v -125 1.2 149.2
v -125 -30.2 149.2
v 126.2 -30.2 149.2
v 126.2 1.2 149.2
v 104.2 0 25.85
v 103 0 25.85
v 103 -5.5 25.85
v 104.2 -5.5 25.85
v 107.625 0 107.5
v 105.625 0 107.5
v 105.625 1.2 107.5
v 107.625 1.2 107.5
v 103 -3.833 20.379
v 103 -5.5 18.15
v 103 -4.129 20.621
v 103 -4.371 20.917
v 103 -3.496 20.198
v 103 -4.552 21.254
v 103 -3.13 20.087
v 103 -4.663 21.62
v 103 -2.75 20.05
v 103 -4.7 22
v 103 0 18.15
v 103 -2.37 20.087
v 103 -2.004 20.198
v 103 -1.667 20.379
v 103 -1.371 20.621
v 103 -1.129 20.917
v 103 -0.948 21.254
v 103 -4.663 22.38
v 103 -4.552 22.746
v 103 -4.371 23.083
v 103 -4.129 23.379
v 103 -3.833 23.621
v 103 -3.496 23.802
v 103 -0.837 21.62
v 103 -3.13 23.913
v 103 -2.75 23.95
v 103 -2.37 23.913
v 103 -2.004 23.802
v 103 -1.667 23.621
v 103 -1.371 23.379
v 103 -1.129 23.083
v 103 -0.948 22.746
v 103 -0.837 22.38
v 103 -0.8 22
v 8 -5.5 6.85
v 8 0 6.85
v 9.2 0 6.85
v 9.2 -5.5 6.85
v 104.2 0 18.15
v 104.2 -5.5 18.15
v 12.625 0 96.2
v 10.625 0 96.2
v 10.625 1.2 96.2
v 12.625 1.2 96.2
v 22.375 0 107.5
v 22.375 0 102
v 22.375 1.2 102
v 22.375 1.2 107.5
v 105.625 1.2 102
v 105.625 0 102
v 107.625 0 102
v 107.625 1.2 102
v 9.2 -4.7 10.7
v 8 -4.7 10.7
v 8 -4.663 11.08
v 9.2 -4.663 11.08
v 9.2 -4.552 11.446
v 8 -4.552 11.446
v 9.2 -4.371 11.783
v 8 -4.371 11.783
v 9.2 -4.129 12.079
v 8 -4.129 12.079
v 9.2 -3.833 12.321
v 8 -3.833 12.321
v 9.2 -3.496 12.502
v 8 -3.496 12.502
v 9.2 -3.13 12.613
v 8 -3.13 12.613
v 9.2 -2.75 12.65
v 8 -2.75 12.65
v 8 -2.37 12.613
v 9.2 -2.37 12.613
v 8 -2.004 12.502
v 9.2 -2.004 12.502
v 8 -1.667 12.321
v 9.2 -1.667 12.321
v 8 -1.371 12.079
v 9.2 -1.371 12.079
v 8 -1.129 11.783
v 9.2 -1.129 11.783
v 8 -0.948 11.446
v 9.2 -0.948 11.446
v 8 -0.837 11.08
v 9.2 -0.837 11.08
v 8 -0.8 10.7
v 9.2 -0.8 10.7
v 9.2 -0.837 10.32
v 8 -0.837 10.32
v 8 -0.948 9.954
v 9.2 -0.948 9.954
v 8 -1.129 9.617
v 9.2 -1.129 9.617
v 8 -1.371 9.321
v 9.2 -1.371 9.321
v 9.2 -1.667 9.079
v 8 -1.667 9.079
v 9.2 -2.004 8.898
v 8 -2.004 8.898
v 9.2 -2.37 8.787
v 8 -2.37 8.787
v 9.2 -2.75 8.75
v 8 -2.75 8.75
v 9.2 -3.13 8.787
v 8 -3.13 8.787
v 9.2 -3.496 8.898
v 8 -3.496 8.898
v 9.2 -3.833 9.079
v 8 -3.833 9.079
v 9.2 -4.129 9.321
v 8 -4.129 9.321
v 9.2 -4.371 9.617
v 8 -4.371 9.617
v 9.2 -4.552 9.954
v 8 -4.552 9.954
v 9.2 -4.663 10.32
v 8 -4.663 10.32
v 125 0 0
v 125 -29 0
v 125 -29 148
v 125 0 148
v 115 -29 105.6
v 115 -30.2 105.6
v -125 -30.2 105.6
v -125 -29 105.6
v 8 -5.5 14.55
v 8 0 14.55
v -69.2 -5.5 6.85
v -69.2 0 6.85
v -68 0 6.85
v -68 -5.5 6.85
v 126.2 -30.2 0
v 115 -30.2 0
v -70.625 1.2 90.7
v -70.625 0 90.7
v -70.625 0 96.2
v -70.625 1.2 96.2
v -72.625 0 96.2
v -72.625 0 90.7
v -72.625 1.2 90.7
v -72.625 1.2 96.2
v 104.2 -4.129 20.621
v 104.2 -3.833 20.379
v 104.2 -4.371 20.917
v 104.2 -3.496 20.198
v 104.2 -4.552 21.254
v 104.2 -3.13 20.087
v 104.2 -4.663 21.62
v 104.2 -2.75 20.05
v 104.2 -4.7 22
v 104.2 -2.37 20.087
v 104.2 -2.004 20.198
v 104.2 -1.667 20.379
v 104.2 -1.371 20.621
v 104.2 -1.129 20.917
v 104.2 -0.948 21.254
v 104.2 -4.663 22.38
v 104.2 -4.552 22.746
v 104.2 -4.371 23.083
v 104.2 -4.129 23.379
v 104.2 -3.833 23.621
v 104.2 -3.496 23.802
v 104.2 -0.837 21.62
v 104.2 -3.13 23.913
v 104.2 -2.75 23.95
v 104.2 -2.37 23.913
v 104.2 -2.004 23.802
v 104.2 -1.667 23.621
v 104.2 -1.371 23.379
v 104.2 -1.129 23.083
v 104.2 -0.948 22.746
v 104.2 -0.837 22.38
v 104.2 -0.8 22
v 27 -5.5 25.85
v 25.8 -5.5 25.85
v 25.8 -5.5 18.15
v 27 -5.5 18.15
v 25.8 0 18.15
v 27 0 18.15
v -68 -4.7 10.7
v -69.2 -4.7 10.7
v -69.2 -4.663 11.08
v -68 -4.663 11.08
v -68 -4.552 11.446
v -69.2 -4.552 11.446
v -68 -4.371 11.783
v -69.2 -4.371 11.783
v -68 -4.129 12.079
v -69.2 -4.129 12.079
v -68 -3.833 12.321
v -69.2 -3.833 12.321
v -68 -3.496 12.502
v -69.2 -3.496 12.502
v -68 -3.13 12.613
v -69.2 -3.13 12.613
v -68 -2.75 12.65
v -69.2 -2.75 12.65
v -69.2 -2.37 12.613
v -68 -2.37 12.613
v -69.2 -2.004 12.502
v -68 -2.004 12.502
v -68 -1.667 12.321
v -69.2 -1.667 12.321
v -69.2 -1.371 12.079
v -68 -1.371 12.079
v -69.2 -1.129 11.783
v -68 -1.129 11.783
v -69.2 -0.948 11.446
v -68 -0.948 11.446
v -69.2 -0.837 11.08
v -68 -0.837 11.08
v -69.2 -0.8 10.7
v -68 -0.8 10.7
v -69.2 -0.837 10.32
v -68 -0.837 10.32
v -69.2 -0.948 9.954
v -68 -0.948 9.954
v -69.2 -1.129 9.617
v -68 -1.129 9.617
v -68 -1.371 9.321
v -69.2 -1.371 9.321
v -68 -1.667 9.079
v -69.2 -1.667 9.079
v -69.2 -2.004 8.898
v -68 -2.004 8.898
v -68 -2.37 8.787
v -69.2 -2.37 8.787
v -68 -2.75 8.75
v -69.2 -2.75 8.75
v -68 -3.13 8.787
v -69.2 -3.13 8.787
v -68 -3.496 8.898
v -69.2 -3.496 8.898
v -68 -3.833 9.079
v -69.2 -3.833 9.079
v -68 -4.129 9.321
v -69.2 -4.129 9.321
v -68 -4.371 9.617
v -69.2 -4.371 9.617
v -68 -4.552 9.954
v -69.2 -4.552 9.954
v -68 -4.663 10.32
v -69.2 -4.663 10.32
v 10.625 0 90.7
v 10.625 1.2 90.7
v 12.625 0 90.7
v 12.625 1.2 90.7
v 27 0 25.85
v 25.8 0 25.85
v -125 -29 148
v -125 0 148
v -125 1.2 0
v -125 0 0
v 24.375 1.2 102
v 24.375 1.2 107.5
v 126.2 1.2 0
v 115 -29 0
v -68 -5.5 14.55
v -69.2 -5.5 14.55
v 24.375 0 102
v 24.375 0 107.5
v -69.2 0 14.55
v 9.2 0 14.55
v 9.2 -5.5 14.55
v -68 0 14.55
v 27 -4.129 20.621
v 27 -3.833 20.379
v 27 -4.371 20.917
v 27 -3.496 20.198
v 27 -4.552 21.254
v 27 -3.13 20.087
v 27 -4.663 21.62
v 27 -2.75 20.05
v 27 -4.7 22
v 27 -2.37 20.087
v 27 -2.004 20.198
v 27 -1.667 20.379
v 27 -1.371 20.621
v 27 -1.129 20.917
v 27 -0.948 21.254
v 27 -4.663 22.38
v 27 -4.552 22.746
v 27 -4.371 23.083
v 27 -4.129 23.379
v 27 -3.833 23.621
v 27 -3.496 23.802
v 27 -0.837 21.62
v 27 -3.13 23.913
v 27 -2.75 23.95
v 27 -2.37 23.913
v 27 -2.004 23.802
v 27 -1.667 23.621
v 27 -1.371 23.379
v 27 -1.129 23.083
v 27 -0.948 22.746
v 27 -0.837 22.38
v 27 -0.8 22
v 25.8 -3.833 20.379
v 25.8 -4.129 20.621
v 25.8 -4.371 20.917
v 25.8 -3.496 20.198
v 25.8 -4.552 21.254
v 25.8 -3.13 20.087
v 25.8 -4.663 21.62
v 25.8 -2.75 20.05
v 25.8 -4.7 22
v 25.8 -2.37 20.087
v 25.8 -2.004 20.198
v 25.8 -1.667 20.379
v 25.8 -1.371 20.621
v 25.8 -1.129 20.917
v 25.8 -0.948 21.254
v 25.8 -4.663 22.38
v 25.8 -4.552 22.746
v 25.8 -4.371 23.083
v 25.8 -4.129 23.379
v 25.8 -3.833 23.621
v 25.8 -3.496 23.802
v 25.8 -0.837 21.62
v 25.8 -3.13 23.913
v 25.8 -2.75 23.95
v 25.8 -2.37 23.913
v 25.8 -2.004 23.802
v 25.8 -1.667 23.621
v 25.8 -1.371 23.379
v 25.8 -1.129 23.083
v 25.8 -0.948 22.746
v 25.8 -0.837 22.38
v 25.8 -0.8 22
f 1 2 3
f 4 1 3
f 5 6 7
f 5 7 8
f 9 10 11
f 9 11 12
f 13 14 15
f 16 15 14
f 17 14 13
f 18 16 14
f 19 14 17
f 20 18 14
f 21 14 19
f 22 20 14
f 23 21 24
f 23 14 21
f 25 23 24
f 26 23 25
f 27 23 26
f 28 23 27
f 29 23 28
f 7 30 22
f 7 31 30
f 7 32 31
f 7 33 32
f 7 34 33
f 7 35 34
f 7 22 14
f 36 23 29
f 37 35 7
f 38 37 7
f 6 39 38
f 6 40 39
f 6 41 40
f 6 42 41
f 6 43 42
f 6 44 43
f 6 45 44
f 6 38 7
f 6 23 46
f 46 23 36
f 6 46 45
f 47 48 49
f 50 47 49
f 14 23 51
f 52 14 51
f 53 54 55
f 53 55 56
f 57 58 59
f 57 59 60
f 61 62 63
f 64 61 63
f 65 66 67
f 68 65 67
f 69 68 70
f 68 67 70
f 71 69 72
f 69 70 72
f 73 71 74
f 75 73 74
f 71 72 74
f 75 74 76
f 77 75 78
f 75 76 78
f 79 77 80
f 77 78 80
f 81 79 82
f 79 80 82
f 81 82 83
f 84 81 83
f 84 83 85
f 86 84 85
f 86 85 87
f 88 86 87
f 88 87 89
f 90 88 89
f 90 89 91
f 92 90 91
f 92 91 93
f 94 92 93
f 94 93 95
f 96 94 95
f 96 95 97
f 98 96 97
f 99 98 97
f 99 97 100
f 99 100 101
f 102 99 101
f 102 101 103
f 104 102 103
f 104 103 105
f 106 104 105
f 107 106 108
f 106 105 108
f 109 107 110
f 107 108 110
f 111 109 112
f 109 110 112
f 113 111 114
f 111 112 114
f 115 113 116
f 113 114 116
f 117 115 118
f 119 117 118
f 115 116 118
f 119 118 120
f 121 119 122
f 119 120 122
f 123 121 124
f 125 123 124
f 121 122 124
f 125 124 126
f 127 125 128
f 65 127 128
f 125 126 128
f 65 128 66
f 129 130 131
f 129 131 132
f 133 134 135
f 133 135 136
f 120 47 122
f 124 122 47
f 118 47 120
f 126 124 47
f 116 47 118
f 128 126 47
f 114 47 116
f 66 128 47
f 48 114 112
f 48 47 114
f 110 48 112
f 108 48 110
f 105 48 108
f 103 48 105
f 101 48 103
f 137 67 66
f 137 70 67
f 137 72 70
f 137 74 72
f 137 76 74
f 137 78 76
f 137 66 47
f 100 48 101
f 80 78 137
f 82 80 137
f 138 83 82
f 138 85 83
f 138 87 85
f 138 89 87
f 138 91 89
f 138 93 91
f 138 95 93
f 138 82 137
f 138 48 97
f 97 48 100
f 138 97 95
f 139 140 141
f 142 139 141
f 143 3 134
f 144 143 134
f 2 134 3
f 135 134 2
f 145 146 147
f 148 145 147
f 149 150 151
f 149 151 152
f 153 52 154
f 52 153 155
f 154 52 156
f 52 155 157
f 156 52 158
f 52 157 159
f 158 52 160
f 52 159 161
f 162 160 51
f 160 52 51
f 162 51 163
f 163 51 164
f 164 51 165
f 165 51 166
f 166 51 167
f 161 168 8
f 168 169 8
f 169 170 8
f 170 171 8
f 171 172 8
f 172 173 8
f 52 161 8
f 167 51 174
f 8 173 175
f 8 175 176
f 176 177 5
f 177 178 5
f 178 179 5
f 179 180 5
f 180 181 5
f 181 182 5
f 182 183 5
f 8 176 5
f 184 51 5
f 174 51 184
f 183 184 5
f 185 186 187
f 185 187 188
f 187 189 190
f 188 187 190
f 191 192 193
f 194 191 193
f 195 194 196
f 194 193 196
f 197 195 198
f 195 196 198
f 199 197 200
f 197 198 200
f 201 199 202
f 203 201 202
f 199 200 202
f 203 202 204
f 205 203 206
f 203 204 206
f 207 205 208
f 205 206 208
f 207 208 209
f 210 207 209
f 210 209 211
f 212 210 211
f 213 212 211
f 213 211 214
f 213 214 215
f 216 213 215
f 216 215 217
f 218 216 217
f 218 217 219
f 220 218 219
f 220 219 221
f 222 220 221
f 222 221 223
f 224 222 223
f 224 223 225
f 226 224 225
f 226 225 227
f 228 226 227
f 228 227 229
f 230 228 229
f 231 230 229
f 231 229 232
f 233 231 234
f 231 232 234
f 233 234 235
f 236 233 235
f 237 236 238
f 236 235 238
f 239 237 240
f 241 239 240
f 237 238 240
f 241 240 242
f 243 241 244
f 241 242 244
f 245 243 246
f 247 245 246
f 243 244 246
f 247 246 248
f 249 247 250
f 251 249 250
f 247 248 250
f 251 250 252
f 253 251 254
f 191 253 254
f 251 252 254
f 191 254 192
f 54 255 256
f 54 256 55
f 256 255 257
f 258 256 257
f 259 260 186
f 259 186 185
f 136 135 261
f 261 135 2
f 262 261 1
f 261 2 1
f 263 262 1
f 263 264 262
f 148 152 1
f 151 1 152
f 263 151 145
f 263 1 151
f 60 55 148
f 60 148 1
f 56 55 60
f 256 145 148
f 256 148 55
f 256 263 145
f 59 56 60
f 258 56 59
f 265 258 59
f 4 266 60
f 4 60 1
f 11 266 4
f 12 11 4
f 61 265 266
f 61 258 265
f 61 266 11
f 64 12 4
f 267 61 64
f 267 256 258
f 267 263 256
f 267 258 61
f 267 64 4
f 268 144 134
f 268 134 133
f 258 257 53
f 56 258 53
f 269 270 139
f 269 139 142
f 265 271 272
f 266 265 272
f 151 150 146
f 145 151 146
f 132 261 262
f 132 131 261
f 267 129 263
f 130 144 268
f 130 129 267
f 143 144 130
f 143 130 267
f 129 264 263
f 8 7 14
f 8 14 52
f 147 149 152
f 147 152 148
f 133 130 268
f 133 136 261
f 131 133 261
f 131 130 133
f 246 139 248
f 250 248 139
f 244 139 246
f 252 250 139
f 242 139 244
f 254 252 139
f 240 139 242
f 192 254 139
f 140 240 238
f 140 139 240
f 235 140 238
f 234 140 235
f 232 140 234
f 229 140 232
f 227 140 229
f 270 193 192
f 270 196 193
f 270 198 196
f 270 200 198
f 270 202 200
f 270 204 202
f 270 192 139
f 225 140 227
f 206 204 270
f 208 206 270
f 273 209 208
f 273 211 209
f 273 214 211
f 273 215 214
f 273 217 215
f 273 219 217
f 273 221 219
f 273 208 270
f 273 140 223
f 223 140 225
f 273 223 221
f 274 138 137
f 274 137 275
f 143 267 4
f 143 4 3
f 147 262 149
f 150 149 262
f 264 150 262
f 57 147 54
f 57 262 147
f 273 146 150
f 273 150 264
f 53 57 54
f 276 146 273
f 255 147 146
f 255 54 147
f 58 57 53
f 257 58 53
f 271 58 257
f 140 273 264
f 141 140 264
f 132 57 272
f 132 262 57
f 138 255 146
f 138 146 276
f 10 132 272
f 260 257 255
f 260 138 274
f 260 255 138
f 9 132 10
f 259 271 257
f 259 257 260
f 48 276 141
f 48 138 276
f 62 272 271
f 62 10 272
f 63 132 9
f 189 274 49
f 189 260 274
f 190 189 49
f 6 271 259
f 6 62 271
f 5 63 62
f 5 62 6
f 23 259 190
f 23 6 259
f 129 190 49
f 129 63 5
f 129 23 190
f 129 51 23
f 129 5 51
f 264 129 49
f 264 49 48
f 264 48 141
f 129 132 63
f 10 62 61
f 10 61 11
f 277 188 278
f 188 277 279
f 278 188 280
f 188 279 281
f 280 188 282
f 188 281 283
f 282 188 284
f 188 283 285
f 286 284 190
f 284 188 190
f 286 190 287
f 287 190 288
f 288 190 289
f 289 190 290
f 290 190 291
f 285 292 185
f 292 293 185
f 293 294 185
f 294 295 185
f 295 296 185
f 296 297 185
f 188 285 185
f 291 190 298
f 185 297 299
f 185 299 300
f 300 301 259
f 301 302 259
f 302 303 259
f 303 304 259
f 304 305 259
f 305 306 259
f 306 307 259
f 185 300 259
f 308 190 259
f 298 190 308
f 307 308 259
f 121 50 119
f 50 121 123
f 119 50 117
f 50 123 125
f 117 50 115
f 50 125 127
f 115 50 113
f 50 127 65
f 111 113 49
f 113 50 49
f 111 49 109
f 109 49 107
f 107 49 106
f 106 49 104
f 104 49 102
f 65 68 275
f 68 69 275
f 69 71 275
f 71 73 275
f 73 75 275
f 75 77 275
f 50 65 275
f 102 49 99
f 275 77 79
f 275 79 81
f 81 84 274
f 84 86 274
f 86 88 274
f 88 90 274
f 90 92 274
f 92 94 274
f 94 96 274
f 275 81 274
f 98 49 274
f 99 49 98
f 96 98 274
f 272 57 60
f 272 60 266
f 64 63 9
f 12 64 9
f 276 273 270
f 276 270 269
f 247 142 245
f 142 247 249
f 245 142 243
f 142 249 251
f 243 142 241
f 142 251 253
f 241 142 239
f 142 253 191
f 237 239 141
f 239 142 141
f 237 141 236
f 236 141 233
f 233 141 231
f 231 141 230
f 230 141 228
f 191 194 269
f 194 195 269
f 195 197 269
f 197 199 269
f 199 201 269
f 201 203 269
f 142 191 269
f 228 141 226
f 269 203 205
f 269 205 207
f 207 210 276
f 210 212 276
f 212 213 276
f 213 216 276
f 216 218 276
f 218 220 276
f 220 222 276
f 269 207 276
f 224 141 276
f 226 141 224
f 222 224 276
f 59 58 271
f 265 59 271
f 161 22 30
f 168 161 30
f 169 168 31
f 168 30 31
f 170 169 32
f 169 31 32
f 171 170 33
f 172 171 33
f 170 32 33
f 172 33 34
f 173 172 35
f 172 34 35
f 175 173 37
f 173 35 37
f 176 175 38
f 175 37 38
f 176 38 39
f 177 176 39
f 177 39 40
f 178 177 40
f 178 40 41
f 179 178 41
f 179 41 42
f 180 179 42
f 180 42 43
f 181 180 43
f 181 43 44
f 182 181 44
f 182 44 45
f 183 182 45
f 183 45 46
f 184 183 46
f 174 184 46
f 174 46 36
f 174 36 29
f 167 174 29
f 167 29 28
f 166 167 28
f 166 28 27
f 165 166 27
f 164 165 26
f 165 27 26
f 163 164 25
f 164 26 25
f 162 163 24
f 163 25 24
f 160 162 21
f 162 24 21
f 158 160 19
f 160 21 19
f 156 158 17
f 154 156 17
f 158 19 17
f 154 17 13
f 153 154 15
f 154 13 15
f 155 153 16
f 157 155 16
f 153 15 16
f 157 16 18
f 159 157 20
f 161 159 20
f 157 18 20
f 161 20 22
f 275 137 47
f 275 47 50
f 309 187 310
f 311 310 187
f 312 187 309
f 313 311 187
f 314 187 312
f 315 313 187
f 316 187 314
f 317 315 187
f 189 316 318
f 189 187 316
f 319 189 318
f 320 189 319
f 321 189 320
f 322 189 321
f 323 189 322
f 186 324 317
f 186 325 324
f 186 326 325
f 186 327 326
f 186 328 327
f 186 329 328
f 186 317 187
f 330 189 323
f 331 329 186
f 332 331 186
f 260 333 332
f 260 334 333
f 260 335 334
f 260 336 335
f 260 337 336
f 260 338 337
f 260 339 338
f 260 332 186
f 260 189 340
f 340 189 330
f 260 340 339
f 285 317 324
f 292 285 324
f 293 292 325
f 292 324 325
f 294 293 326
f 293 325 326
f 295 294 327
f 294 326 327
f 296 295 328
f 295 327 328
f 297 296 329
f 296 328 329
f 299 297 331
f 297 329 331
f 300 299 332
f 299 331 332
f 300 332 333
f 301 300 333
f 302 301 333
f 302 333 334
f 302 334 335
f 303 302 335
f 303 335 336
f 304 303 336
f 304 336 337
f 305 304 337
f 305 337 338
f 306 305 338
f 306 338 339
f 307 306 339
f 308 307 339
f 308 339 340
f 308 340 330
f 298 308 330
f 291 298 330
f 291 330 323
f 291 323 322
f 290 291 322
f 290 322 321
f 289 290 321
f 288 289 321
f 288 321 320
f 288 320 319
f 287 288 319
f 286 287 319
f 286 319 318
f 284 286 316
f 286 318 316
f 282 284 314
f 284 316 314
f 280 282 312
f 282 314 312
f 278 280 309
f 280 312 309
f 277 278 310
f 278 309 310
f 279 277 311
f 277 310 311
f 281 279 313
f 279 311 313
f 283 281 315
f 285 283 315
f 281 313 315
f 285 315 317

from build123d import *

# Parameters (mm, degrees)
F1_DEPTH = 125
F3_DEPTH = 149.2
F4_W     = 2
F4_H     = 5.5
F5_DEPTH = 1.201
F4_W_2   = 1.2
F4_H_2   = 7.7
F6_DEPTH = 5.5
F7_R     = 1.95
F8_R     = 1.95
F9_DEPTH = 78.4


with BuildPart() as f1:
    # F0 (on Right) → F1 (new body, symmetric)
    with BuildSketch(Plane.YZ):
        Polygon((0, 148), (0, 0), (1.2, 0), (1.2, 149.2), (-30.2, 149.2), (-30.2, 105.6), (-29, 105.6), (-29, 148), align=None)
    extrude(amount=F1_DEPTH, both=True)

    # F2 (on face) → F3 (join, through all)
    with BuildSketch(Plane(origin=(0, 0, 0), x_dir=(1, 0, 0), z_dir=(0, 0, -1))):
        Polygon((125, 29), (125, -1.2), (126.2, -1.2), (126.2, 30.2), (115, 30.2), (115, 29), align=None)
    extrude(amount=-F3_DEPTH)

    # F4 (on face) → F5 (cut, through all)
    with BuildSketch(Plane.XZ):
        with Locations((23.375, 104.75)):
            Rectangle(F4_W, F4_H)
        with Locations((106.625, 104.75)):
            Rectangle(F4_W, F4_H)
        with Locations((11.625, 93.45)):
            Rectangle(F4_W, F4_H)
        with Locations((-71.625, 93.45)):
            Rectangle(F4_W, F4_H)
    extrude(amount=-F5_DEPTH, mode=Mode.SUBTRACT)

    # F4 (on face) → F6 (join)
    with BuildSketch(Plane.XZ):
        with Locations((26.4, 22)):
            Rectangle(F4_W_2, F4_H_2)
        with Locations((103.6, 22)):
            Rectangle(F4_W_2, F4_H_2)
        with Locations((-68.6, 10.7)):
            Rectangle(F4_W_2, F4_H_2)
        with Locations((8.6, 10.7)):
            Rectangle(F4_W_2, F4_H_2)
    extrude(amount=F6_DEPTH)

    # F7 (on face) + F8 (on face) → F9 (cut, through all)
    with BuildSketch(Plane(origin=(25.8, 0, 0), x_dir=(0, -1, 0), z_dir=(-1, 0, 0))):
        with Locations((2.75, 22)):
            Circle(F7_R)
    with BuildSketch(Plane(origin=(-69.2, 0, 0), x_dir=(0, -1, 0), z_dir=(-1, 0, 0))):
        with Locations((2.75, 10.7)):
            Circle(F8_R)
    extrude(amount=-F9_DEPTH, mode=Mode.SUBTRACT)


solid = f1.part
